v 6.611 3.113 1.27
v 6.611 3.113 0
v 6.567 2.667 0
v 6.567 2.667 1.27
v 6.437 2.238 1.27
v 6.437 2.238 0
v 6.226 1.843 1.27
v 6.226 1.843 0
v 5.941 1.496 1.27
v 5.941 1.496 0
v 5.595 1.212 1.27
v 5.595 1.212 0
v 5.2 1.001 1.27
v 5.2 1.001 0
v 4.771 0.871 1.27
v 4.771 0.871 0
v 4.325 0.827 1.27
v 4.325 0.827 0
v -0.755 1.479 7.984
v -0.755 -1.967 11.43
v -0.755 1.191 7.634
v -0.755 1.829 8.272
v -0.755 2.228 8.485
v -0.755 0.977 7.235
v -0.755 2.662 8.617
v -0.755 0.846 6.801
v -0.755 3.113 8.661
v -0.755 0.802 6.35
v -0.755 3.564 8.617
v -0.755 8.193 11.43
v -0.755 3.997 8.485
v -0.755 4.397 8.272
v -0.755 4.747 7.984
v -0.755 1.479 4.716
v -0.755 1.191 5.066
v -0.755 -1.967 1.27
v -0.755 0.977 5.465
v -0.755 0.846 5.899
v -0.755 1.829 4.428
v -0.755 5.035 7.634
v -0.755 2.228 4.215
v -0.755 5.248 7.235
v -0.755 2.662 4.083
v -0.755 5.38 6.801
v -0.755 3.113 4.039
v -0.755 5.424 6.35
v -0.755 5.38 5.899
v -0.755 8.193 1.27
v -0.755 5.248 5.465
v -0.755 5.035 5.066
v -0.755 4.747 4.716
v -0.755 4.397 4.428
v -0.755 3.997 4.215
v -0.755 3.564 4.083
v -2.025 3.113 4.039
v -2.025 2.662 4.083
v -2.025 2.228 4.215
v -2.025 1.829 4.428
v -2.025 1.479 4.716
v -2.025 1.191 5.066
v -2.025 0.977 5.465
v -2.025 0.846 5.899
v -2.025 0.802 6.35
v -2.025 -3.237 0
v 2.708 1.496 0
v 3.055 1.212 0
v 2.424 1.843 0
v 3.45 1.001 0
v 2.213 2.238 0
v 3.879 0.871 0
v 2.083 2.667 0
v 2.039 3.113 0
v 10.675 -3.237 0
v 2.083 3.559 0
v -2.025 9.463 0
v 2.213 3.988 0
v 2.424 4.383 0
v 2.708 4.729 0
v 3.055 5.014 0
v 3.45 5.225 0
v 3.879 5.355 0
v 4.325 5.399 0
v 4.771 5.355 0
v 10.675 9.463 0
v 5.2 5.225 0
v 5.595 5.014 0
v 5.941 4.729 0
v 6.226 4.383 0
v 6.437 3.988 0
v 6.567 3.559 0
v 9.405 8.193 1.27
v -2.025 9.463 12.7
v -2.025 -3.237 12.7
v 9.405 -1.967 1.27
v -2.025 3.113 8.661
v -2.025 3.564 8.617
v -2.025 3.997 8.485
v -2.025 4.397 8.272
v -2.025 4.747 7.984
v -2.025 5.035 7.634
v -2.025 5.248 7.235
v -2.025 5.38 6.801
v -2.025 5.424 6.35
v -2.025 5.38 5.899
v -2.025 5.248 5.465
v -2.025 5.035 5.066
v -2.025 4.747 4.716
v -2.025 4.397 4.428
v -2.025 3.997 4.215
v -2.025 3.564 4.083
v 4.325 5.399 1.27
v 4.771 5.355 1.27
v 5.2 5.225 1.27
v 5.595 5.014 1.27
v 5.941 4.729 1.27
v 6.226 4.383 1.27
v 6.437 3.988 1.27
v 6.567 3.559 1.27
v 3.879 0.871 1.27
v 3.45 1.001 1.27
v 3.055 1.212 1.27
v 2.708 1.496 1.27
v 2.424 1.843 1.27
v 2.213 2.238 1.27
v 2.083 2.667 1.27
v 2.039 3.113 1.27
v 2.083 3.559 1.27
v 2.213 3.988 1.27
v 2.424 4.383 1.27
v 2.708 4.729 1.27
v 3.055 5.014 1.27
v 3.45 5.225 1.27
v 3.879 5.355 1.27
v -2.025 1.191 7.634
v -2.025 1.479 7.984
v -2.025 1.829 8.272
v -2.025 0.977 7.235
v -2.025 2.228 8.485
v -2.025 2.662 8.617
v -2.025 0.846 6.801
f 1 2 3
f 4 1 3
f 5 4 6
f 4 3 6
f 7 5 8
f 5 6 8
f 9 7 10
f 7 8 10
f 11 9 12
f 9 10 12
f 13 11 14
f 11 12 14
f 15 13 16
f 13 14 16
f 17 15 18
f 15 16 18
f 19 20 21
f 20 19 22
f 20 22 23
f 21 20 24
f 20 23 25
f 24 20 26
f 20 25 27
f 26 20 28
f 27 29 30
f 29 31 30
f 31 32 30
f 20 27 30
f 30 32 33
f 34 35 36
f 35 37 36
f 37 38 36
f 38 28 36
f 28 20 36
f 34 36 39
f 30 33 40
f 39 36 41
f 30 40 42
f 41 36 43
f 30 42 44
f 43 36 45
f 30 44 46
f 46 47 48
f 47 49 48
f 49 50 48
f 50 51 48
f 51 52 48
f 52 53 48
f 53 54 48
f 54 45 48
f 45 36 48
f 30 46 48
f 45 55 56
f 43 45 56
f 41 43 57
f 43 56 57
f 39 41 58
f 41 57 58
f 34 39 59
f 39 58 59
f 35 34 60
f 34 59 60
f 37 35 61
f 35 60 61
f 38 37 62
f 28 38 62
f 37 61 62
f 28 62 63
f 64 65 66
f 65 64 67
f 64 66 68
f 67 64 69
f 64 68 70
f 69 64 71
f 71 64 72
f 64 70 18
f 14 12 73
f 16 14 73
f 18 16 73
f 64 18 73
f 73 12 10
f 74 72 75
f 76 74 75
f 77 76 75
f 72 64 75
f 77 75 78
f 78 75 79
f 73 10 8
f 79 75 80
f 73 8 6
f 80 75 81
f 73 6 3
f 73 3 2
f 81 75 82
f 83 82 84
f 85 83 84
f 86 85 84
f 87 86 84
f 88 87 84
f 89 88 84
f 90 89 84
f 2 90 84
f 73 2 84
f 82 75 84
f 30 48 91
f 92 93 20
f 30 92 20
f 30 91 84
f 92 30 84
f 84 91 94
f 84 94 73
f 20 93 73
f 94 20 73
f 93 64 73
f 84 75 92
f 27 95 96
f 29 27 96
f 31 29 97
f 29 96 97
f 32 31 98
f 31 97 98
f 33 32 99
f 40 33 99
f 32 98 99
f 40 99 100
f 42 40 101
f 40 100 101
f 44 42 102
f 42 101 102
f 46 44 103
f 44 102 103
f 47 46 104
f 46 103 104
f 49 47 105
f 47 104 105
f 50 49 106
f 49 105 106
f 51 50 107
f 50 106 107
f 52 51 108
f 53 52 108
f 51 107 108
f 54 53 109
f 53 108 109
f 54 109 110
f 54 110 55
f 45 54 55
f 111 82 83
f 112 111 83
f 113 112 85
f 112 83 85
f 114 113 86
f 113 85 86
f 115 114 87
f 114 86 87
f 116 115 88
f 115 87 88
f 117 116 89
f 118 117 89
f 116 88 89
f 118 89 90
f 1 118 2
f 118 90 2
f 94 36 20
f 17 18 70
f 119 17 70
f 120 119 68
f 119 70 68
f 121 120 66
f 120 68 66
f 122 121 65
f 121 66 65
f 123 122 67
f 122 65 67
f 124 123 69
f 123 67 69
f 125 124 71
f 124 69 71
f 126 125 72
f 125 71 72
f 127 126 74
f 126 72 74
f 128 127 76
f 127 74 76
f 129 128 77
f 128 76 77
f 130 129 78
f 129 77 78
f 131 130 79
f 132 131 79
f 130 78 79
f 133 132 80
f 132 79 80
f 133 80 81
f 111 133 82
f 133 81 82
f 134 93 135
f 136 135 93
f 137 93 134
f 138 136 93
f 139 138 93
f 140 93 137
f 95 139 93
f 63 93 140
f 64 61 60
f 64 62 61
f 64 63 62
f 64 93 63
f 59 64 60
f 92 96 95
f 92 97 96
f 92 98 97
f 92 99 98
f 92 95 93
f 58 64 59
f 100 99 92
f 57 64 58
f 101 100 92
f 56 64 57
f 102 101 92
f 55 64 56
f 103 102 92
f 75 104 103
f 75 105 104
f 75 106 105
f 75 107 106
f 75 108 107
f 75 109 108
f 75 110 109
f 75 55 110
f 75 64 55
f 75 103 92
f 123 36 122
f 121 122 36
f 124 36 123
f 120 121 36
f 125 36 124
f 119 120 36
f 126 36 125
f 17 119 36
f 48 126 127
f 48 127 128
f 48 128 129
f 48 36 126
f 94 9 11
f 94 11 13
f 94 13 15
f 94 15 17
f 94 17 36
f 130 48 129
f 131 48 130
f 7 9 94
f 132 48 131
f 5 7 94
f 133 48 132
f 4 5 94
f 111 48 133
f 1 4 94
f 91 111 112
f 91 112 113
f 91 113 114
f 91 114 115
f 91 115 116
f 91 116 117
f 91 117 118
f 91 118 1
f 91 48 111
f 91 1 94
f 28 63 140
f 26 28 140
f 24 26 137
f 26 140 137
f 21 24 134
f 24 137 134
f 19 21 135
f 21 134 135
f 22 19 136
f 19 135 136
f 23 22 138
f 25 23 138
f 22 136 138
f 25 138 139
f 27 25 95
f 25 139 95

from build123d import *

# Parameters (mm, degrees)
F0_W     = 12.7
F0_H     = 12.7
F1_DEPTH = 12.7
F3_DEPTH = 25.4
F4_T     = -1.27
F7_DEPTH = 25.4
F8_DEPTH = 25.4


with BuildPart() as f1:
    # F0 (on Top) → F1 (new body)
    with BuildSketch(Plane.XY):
        with Locations((4.3248645961, 3.1129373469)):
            Rectangle(F0_W, F0_H)
    extrude(amount=F1_DEPTH)

    # F2 (on face) → F3 (cut)
    with BuildSketch(Plane.XZ.offset(3.2370626531)):
        Polygon((10.6748645961, 12.7), (-2.0251354039, 12.7), (10.6748645961, 0), align=None)
    extrude(amount=-F3_DEPTH, mode=Mode.SUBTRACT)

    # F4
    f4_openings = [f1.faces().sort_by_distance(p)[0] for p in [
        (4.324865, 3.112937, 6.35),
    ]]
    offset(amount=F4_T, openings=f4_openings)

    # F6 (on face) → F7 (cut)
    with BuildSketch(Plane(origin=(-2.0251354039, 0, 0), x_dir=(0, -1, 0), z_dir=(-1, 0, 0))):
        with BuildLine():
            ThreePointArc((-0.8015373469, 6.35), (-1.4785307329, 7.984406614), (-3.1129373469, 8.6614))
            Line((-3.1129373469, 8.6614), (-3.1129373469, 4.0386))
            ThreePointArc((-3.1129373469, 4.0386), (-1.4785307329, 4.715593386), (-0.8015373469, 6.35))
        make_face()
        with BuildLine():
            Line((-3.1129373469, 4.0386), (-3.1129373469, 8.6614))
            ThreePointArc((-3.1129373469, 8.6614), (-5.4243373469, 6.35), (-3.1129373469, 4.0386))
        make_face()
    extrude(amount=-F7_DEPTH, mode=Mode.SUBTRACT)

    # F5 (on face) → F8 (cut)
    with BuildSketch(Plane(origin=(0, 0, 0), x_dir=(1, 0, 0), z_dir=(0, 0, -1))):
        with BuildLine():
            ThreePointArc((6.6108645961, -3.1129373469), (5.9413106979, -1.4964912451), (4.3248645961, -0.8269373469))
            Line((4.3248645961, -0.8269373469), (4.3248645961, -5.3989373469))
            ThreePointArc((4.3248645961, -5.3989373469), (5.9413106979, -4.7293834487), (6.6108645961, -3.1129373469))
        make_face()
        with BuildLine():
            Line((4.3248645961, -5.3989373469), (4.3248645961, -0.8269373469))
            ThreePointArc((4.3248645961, -0.8269373469), (2.0388645961, -3.1129373469), (4.3248645961, -5.3989373469))
        make_face()
    extrude(amount=-F8_DEPTH, mode=Mode.SUBTRACT)


solid = f1.part
